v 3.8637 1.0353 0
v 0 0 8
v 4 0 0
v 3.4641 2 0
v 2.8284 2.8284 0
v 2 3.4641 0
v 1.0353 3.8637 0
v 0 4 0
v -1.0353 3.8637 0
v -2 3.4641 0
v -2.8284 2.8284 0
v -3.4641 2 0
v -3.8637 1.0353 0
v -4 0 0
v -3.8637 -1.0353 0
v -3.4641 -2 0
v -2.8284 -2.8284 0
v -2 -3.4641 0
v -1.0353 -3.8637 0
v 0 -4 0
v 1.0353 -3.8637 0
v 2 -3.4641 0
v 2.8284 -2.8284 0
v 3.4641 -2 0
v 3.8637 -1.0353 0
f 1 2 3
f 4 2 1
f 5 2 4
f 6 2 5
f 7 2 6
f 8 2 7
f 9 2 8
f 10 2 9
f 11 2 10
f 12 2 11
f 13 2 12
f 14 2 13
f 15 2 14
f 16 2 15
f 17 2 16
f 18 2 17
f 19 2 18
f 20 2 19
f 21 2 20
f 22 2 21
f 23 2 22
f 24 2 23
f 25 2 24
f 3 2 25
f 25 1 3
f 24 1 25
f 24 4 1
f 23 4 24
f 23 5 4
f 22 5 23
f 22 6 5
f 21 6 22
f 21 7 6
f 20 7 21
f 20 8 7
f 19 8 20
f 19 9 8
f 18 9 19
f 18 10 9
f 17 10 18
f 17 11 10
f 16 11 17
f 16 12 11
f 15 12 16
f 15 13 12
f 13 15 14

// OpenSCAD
// cone with a point on top
cylinder(h = 8, r1 = 4, r2 = 0, $fn = 24);
